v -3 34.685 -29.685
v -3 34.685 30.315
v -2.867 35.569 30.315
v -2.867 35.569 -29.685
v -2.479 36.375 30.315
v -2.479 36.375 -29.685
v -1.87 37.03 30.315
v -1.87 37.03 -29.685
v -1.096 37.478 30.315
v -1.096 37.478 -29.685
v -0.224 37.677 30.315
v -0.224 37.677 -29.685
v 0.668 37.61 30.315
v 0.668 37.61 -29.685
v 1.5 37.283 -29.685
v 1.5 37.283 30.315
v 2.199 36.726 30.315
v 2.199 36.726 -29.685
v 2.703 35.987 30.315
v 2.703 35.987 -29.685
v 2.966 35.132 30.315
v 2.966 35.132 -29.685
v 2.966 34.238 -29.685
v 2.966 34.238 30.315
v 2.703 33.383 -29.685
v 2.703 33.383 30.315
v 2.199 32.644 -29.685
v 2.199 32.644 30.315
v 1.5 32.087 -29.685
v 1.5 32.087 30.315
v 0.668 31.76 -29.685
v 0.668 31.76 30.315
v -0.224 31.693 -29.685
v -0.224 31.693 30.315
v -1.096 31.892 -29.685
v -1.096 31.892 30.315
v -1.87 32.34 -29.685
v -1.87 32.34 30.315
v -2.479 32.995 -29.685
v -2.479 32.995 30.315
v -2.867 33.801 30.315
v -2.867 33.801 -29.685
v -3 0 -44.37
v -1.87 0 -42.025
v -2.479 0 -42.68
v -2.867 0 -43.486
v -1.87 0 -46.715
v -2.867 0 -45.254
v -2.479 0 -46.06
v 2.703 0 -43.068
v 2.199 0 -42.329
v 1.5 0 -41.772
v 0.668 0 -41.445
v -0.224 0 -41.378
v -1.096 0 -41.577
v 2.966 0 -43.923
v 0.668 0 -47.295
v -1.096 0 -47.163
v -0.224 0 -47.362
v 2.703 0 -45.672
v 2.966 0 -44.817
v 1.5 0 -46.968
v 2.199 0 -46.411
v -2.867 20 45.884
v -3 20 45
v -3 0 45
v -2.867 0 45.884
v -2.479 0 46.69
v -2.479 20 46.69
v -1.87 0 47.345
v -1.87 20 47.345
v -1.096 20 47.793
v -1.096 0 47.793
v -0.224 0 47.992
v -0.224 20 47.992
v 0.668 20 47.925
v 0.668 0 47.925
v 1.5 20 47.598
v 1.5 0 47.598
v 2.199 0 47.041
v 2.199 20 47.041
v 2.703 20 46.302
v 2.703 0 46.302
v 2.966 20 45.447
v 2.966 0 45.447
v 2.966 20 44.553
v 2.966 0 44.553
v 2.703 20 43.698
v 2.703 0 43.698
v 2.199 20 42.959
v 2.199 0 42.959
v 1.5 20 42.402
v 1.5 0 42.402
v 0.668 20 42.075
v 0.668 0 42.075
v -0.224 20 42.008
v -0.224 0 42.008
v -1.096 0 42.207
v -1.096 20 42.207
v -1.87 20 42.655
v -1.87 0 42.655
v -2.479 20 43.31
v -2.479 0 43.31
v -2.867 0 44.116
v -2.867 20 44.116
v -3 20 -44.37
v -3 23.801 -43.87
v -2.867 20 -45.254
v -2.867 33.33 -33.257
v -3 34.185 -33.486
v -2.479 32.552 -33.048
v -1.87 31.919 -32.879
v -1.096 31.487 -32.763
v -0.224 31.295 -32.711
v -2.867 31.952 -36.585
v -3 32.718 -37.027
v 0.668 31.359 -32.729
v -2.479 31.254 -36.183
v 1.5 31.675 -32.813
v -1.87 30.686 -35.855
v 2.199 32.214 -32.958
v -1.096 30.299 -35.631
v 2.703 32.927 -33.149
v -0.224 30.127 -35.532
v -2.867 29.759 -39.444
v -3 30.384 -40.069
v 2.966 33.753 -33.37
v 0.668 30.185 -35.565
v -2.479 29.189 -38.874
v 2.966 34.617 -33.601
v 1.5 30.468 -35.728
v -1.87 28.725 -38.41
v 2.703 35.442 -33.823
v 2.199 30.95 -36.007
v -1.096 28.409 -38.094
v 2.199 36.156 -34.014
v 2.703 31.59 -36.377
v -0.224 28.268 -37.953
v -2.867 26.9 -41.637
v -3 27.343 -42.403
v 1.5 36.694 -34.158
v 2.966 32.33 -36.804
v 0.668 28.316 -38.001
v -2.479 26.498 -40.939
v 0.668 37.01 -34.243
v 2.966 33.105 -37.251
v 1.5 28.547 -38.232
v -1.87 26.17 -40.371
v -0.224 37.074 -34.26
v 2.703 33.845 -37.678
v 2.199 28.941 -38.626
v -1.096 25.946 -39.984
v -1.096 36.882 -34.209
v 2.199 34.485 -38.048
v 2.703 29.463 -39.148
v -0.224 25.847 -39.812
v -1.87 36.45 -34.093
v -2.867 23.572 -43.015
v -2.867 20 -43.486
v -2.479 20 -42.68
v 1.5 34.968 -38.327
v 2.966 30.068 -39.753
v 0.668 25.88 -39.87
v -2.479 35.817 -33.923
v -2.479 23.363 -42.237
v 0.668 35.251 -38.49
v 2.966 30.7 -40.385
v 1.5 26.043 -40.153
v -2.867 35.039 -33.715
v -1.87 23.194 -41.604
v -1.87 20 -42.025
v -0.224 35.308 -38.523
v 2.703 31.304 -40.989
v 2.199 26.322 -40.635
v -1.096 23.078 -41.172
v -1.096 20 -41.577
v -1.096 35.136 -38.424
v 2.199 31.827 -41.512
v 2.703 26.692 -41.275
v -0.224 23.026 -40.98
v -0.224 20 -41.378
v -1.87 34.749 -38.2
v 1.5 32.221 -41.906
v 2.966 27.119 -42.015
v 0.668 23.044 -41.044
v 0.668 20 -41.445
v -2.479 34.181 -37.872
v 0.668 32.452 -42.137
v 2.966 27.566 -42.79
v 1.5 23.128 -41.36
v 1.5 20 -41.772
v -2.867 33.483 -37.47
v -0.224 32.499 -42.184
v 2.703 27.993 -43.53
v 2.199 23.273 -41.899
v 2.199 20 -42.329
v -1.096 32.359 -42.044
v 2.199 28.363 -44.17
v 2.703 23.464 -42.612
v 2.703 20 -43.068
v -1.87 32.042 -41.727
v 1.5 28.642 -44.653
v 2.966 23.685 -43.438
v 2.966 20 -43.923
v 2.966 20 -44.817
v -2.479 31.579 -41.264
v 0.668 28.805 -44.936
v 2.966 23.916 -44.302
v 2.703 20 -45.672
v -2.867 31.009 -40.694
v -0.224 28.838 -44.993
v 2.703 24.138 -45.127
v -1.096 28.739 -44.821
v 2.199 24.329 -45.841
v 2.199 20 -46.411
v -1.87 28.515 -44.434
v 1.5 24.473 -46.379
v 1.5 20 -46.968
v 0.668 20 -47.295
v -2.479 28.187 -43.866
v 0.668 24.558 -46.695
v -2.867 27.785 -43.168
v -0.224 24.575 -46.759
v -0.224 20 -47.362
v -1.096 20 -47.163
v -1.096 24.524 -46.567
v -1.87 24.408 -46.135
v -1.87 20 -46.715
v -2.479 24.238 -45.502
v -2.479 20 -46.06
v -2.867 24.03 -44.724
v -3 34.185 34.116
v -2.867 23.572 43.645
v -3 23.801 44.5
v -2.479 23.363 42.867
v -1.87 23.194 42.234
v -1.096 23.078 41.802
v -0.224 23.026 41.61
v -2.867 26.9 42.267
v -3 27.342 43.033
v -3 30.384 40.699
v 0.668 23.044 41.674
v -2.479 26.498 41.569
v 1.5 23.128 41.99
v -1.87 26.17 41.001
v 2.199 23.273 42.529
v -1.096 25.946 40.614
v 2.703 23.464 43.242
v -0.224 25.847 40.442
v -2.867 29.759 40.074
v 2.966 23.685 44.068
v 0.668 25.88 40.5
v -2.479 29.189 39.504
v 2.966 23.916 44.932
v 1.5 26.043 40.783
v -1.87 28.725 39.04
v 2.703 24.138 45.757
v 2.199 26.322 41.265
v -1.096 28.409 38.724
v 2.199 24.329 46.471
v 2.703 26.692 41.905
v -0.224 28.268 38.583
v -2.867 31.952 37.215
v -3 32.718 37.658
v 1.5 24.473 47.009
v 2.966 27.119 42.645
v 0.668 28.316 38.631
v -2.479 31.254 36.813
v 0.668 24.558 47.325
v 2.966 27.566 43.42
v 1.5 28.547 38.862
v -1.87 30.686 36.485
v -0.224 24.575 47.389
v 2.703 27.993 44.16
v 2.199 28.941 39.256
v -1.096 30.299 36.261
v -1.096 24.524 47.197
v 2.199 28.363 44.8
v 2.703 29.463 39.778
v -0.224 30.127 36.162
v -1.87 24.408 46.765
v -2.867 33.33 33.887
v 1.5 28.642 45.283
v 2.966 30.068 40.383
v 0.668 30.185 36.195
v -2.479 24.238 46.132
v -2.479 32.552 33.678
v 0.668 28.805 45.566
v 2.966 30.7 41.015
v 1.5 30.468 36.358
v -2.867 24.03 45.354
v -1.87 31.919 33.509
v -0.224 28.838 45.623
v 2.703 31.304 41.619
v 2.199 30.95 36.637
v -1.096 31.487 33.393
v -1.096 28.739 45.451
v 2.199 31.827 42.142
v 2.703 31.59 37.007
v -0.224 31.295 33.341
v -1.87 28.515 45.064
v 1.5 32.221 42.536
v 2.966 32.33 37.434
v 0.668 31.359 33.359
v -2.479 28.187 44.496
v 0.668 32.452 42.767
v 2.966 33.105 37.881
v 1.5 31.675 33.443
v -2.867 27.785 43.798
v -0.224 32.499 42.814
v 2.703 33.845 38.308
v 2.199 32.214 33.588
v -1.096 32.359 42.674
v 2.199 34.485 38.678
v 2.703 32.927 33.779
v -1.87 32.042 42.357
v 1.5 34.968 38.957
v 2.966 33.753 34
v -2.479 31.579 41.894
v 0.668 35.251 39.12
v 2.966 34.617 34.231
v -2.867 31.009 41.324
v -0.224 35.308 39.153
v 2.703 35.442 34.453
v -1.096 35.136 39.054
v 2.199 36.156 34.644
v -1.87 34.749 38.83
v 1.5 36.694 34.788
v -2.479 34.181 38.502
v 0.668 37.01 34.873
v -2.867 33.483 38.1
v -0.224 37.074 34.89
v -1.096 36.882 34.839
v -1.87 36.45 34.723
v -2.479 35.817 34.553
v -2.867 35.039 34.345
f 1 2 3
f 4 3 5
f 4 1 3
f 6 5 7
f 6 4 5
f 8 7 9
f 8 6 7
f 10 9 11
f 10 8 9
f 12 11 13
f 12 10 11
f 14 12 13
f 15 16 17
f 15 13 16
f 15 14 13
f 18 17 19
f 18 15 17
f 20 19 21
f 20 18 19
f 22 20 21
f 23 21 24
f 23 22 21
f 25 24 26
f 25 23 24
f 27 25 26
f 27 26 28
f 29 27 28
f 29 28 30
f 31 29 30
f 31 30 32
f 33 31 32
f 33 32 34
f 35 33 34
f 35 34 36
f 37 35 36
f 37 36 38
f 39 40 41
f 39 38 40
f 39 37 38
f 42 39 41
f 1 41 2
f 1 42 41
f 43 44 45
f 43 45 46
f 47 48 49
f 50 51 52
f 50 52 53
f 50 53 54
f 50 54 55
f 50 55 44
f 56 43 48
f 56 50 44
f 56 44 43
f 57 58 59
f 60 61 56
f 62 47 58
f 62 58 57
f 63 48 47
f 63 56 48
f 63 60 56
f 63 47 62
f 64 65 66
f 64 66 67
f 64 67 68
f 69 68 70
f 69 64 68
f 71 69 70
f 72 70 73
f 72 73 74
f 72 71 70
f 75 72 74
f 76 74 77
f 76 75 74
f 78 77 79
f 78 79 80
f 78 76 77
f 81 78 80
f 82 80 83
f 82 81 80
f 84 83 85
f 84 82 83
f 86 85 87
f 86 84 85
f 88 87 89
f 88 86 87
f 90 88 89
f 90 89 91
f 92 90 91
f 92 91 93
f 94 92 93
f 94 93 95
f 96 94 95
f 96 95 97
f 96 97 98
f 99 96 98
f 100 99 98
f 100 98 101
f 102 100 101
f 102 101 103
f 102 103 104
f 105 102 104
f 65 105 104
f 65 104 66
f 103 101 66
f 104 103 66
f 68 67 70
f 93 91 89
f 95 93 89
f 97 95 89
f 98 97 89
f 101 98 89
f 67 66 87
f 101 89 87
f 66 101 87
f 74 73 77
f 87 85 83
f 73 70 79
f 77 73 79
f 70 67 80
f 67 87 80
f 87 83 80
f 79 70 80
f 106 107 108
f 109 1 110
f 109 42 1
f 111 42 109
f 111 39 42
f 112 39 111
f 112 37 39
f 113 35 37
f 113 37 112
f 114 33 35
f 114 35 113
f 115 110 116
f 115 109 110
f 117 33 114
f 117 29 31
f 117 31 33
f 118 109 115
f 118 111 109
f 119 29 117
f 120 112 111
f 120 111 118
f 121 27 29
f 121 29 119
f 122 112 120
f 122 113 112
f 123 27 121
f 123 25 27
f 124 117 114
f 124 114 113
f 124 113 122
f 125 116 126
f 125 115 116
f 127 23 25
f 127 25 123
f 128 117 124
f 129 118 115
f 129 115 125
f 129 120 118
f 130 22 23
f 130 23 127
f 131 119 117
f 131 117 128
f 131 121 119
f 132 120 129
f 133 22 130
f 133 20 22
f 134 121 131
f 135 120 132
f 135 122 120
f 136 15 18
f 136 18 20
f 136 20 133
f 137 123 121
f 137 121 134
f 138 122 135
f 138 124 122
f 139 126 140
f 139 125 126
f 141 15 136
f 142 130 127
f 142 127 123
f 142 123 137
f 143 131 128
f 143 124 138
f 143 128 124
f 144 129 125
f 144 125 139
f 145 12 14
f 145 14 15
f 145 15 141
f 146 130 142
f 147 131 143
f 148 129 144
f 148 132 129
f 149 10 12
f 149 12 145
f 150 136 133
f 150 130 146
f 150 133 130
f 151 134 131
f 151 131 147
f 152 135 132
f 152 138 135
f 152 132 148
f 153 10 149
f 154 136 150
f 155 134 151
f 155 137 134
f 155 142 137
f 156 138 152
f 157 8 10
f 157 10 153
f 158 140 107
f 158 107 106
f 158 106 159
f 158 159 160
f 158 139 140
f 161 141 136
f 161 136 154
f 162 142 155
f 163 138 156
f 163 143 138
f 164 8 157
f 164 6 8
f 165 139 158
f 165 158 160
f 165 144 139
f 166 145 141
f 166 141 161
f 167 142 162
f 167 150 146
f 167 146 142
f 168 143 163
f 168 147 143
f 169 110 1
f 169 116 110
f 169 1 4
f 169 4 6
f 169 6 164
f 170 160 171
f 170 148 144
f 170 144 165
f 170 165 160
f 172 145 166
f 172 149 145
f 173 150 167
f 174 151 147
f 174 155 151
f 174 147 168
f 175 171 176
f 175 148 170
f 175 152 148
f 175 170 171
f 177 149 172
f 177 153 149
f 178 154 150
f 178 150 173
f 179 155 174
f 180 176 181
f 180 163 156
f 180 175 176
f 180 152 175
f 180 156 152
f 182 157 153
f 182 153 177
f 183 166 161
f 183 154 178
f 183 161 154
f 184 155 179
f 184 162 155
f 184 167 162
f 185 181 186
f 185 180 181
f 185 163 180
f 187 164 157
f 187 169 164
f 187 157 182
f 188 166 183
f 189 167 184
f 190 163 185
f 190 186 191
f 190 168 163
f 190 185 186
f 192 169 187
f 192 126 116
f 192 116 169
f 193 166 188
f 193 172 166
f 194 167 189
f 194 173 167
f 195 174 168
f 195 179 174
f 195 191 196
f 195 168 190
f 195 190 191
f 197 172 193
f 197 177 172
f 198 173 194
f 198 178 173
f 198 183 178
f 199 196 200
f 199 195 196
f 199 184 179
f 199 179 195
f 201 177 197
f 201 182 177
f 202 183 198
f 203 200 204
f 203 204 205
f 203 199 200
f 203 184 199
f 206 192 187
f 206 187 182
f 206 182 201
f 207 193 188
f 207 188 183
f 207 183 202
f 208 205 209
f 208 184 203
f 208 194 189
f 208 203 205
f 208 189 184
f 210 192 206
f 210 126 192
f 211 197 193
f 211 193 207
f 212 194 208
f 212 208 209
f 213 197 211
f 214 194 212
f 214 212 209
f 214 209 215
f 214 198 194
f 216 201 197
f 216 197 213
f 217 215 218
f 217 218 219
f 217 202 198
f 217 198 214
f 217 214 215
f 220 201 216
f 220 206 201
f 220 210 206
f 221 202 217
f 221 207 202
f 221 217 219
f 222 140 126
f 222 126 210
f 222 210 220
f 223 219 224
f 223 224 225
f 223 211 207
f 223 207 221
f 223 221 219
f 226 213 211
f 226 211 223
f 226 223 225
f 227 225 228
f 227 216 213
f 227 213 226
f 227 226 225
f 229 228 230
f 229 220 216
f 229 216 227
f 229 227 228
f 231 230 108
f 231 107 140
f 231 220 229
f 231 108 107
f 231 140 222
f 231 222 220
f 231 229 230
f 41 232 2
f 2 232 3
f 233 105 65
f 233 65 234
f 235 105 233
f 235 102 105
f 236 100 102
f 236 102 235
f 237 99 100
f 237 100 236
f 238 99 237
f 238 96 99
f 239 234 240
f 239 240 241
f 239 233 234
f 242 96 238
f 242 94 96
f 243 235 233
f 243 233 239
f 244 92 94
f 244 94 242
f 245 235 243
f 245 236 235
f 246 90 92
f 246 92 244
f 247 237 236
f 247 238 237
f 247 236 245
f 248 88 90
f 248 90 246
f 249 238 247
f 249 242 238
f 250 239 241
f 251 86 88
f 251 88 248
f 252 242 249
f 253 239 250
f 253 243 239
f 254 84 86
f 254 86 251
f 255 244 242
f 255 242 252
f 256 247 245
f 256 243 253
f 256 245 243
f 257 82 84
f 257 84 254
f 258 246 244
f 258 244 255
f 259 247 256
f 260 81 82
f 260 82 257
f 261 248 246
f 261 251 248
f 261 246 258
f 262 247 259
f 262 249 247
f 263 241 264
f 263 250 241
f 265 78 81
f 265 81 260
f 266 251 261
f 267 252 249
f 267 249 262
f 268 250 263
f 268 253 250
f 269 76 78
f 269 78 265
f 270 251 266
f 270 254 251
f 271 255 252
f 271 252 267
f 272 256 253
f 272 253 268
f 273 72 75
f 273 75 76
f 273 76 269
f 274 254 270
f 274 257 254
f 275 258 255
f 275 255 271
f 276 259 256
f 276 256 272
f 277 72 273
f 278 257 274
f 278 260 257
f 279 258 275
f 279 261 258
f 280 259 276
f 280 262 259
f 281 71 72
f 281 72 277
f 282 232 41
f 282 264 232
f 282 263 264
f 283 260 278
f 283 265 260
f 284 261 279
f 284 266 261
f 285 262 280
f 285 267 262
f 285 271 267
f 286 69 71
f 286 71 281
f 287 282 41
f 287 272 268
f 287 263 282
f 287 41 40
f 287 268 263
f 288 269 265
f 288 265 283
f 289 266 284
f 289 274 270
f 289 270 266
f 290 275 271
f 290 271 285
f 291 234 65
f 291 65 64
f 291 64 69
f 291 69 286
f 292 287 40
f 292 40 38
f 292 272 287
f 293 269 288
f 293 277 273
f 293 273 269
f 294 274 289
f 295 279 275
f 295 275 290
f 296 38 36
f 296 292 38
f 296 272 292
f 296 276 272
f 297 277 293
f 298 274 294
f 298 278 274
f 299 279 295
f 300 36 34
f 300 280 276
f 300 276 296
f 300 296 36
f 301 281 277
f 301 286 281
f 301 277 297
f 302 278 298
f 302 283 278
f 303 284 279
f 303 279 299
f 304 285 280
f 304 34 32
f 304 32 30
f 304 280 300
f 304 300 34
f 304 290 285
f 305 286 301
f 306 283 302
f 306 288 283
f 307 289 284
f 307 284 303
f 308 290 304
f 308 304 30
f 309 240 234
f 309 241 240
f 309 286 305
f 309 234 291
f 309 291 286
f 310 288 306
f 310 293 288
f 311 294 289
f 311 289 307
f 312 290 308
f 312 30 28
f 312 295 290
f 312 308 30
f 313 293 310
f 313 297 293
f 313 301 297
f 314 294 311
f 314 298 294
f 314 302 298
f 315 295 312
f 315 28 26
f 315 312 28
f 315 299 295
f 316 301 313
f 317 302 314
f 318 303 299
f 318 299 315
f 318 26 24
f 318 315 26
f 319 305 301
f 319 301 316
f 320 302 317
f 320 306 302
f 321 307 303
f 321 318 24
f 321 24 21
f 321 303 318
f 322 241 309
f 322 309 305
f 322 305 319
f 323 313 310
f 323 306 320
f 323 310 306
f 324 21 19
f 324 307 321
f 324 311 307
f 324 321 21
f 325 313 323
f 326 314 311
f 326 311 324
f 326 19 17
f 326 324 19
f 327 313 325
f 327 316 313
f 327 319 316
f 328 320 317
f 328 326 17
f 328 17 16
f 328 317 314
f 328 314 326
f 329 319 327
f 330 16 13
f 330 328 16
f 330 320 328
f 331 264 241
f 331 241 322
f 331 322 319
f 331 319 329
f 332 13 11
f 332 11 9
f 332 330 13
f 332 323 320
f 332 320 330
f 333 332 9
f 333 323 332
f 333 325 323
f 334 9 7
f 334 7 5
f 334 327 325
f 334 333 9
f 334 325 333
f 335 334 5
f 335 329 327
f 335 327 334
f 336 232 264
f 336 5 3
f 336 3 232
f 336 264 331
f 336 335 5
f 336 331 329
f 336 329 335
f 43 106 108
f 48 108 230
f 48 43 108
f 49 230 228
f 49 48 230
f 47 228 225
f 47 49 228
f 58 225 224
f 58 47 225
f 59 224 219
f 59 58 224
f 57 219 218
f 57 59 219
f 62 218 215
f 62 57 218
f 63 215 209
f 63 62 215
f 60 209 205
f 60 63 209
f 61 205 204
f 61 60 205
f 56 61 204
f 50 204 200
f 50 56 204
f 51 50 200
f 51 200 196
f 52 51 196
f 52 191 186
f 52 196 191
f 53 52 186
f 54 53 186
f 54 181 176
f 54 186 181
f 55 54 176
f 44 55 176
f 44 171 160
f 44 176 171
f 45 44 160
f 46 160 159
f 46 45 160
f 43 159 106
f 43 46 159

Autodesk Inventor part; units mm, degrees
ref_plane "YZ Plane" through (0, 0, 0) normal (1, 0, 0) x (0, 1, 0)
ref_plane "XZ Plane" through (0, 0, 0) normal (0, 1, 0) x (-1, 0, 0)
ref_plane "XY Plane" through (0, 0, 0) normal (0, 0, 1) x (1, 0, 0)
sketch "Boceto1" plane through (0, 0, 0) normal (1, 0, 0) x (0, 1, 0)
  line L0 (0, 45.315) -> (20, 45.315)
  line L1 (35, 30.315) -> (35, -29.685)
  line L2 (20, -44.685) -> (0, -44.685)
  arc A0 (35, 30.315) -> (20, 45.315) centre (20, 30.315) ccw
  arc A1 (20, -44.685) -> (35, -29.685) centre (20, -29.685) ccw
  point P0 (0, 0)
  point P1 (35, 45.315)
  point P2 (35, -44.685)
  dimension "d0" = 35
  dimension "d1" = 90
  dimension "d2" = 15
sketch "Boceto2" plane through (0, 0, 0) normal (0, 1, 0) x (-1, 0, 0)
  circle A0 centre (0, 45) radius 3
  point P0 (0, 0)
  dimension "d3" = 6
sweep "Barrido1" add profiles "Boceto2" path "Boceto1"
properties part number "AGARRADERA" material "Acero inoxidable"
